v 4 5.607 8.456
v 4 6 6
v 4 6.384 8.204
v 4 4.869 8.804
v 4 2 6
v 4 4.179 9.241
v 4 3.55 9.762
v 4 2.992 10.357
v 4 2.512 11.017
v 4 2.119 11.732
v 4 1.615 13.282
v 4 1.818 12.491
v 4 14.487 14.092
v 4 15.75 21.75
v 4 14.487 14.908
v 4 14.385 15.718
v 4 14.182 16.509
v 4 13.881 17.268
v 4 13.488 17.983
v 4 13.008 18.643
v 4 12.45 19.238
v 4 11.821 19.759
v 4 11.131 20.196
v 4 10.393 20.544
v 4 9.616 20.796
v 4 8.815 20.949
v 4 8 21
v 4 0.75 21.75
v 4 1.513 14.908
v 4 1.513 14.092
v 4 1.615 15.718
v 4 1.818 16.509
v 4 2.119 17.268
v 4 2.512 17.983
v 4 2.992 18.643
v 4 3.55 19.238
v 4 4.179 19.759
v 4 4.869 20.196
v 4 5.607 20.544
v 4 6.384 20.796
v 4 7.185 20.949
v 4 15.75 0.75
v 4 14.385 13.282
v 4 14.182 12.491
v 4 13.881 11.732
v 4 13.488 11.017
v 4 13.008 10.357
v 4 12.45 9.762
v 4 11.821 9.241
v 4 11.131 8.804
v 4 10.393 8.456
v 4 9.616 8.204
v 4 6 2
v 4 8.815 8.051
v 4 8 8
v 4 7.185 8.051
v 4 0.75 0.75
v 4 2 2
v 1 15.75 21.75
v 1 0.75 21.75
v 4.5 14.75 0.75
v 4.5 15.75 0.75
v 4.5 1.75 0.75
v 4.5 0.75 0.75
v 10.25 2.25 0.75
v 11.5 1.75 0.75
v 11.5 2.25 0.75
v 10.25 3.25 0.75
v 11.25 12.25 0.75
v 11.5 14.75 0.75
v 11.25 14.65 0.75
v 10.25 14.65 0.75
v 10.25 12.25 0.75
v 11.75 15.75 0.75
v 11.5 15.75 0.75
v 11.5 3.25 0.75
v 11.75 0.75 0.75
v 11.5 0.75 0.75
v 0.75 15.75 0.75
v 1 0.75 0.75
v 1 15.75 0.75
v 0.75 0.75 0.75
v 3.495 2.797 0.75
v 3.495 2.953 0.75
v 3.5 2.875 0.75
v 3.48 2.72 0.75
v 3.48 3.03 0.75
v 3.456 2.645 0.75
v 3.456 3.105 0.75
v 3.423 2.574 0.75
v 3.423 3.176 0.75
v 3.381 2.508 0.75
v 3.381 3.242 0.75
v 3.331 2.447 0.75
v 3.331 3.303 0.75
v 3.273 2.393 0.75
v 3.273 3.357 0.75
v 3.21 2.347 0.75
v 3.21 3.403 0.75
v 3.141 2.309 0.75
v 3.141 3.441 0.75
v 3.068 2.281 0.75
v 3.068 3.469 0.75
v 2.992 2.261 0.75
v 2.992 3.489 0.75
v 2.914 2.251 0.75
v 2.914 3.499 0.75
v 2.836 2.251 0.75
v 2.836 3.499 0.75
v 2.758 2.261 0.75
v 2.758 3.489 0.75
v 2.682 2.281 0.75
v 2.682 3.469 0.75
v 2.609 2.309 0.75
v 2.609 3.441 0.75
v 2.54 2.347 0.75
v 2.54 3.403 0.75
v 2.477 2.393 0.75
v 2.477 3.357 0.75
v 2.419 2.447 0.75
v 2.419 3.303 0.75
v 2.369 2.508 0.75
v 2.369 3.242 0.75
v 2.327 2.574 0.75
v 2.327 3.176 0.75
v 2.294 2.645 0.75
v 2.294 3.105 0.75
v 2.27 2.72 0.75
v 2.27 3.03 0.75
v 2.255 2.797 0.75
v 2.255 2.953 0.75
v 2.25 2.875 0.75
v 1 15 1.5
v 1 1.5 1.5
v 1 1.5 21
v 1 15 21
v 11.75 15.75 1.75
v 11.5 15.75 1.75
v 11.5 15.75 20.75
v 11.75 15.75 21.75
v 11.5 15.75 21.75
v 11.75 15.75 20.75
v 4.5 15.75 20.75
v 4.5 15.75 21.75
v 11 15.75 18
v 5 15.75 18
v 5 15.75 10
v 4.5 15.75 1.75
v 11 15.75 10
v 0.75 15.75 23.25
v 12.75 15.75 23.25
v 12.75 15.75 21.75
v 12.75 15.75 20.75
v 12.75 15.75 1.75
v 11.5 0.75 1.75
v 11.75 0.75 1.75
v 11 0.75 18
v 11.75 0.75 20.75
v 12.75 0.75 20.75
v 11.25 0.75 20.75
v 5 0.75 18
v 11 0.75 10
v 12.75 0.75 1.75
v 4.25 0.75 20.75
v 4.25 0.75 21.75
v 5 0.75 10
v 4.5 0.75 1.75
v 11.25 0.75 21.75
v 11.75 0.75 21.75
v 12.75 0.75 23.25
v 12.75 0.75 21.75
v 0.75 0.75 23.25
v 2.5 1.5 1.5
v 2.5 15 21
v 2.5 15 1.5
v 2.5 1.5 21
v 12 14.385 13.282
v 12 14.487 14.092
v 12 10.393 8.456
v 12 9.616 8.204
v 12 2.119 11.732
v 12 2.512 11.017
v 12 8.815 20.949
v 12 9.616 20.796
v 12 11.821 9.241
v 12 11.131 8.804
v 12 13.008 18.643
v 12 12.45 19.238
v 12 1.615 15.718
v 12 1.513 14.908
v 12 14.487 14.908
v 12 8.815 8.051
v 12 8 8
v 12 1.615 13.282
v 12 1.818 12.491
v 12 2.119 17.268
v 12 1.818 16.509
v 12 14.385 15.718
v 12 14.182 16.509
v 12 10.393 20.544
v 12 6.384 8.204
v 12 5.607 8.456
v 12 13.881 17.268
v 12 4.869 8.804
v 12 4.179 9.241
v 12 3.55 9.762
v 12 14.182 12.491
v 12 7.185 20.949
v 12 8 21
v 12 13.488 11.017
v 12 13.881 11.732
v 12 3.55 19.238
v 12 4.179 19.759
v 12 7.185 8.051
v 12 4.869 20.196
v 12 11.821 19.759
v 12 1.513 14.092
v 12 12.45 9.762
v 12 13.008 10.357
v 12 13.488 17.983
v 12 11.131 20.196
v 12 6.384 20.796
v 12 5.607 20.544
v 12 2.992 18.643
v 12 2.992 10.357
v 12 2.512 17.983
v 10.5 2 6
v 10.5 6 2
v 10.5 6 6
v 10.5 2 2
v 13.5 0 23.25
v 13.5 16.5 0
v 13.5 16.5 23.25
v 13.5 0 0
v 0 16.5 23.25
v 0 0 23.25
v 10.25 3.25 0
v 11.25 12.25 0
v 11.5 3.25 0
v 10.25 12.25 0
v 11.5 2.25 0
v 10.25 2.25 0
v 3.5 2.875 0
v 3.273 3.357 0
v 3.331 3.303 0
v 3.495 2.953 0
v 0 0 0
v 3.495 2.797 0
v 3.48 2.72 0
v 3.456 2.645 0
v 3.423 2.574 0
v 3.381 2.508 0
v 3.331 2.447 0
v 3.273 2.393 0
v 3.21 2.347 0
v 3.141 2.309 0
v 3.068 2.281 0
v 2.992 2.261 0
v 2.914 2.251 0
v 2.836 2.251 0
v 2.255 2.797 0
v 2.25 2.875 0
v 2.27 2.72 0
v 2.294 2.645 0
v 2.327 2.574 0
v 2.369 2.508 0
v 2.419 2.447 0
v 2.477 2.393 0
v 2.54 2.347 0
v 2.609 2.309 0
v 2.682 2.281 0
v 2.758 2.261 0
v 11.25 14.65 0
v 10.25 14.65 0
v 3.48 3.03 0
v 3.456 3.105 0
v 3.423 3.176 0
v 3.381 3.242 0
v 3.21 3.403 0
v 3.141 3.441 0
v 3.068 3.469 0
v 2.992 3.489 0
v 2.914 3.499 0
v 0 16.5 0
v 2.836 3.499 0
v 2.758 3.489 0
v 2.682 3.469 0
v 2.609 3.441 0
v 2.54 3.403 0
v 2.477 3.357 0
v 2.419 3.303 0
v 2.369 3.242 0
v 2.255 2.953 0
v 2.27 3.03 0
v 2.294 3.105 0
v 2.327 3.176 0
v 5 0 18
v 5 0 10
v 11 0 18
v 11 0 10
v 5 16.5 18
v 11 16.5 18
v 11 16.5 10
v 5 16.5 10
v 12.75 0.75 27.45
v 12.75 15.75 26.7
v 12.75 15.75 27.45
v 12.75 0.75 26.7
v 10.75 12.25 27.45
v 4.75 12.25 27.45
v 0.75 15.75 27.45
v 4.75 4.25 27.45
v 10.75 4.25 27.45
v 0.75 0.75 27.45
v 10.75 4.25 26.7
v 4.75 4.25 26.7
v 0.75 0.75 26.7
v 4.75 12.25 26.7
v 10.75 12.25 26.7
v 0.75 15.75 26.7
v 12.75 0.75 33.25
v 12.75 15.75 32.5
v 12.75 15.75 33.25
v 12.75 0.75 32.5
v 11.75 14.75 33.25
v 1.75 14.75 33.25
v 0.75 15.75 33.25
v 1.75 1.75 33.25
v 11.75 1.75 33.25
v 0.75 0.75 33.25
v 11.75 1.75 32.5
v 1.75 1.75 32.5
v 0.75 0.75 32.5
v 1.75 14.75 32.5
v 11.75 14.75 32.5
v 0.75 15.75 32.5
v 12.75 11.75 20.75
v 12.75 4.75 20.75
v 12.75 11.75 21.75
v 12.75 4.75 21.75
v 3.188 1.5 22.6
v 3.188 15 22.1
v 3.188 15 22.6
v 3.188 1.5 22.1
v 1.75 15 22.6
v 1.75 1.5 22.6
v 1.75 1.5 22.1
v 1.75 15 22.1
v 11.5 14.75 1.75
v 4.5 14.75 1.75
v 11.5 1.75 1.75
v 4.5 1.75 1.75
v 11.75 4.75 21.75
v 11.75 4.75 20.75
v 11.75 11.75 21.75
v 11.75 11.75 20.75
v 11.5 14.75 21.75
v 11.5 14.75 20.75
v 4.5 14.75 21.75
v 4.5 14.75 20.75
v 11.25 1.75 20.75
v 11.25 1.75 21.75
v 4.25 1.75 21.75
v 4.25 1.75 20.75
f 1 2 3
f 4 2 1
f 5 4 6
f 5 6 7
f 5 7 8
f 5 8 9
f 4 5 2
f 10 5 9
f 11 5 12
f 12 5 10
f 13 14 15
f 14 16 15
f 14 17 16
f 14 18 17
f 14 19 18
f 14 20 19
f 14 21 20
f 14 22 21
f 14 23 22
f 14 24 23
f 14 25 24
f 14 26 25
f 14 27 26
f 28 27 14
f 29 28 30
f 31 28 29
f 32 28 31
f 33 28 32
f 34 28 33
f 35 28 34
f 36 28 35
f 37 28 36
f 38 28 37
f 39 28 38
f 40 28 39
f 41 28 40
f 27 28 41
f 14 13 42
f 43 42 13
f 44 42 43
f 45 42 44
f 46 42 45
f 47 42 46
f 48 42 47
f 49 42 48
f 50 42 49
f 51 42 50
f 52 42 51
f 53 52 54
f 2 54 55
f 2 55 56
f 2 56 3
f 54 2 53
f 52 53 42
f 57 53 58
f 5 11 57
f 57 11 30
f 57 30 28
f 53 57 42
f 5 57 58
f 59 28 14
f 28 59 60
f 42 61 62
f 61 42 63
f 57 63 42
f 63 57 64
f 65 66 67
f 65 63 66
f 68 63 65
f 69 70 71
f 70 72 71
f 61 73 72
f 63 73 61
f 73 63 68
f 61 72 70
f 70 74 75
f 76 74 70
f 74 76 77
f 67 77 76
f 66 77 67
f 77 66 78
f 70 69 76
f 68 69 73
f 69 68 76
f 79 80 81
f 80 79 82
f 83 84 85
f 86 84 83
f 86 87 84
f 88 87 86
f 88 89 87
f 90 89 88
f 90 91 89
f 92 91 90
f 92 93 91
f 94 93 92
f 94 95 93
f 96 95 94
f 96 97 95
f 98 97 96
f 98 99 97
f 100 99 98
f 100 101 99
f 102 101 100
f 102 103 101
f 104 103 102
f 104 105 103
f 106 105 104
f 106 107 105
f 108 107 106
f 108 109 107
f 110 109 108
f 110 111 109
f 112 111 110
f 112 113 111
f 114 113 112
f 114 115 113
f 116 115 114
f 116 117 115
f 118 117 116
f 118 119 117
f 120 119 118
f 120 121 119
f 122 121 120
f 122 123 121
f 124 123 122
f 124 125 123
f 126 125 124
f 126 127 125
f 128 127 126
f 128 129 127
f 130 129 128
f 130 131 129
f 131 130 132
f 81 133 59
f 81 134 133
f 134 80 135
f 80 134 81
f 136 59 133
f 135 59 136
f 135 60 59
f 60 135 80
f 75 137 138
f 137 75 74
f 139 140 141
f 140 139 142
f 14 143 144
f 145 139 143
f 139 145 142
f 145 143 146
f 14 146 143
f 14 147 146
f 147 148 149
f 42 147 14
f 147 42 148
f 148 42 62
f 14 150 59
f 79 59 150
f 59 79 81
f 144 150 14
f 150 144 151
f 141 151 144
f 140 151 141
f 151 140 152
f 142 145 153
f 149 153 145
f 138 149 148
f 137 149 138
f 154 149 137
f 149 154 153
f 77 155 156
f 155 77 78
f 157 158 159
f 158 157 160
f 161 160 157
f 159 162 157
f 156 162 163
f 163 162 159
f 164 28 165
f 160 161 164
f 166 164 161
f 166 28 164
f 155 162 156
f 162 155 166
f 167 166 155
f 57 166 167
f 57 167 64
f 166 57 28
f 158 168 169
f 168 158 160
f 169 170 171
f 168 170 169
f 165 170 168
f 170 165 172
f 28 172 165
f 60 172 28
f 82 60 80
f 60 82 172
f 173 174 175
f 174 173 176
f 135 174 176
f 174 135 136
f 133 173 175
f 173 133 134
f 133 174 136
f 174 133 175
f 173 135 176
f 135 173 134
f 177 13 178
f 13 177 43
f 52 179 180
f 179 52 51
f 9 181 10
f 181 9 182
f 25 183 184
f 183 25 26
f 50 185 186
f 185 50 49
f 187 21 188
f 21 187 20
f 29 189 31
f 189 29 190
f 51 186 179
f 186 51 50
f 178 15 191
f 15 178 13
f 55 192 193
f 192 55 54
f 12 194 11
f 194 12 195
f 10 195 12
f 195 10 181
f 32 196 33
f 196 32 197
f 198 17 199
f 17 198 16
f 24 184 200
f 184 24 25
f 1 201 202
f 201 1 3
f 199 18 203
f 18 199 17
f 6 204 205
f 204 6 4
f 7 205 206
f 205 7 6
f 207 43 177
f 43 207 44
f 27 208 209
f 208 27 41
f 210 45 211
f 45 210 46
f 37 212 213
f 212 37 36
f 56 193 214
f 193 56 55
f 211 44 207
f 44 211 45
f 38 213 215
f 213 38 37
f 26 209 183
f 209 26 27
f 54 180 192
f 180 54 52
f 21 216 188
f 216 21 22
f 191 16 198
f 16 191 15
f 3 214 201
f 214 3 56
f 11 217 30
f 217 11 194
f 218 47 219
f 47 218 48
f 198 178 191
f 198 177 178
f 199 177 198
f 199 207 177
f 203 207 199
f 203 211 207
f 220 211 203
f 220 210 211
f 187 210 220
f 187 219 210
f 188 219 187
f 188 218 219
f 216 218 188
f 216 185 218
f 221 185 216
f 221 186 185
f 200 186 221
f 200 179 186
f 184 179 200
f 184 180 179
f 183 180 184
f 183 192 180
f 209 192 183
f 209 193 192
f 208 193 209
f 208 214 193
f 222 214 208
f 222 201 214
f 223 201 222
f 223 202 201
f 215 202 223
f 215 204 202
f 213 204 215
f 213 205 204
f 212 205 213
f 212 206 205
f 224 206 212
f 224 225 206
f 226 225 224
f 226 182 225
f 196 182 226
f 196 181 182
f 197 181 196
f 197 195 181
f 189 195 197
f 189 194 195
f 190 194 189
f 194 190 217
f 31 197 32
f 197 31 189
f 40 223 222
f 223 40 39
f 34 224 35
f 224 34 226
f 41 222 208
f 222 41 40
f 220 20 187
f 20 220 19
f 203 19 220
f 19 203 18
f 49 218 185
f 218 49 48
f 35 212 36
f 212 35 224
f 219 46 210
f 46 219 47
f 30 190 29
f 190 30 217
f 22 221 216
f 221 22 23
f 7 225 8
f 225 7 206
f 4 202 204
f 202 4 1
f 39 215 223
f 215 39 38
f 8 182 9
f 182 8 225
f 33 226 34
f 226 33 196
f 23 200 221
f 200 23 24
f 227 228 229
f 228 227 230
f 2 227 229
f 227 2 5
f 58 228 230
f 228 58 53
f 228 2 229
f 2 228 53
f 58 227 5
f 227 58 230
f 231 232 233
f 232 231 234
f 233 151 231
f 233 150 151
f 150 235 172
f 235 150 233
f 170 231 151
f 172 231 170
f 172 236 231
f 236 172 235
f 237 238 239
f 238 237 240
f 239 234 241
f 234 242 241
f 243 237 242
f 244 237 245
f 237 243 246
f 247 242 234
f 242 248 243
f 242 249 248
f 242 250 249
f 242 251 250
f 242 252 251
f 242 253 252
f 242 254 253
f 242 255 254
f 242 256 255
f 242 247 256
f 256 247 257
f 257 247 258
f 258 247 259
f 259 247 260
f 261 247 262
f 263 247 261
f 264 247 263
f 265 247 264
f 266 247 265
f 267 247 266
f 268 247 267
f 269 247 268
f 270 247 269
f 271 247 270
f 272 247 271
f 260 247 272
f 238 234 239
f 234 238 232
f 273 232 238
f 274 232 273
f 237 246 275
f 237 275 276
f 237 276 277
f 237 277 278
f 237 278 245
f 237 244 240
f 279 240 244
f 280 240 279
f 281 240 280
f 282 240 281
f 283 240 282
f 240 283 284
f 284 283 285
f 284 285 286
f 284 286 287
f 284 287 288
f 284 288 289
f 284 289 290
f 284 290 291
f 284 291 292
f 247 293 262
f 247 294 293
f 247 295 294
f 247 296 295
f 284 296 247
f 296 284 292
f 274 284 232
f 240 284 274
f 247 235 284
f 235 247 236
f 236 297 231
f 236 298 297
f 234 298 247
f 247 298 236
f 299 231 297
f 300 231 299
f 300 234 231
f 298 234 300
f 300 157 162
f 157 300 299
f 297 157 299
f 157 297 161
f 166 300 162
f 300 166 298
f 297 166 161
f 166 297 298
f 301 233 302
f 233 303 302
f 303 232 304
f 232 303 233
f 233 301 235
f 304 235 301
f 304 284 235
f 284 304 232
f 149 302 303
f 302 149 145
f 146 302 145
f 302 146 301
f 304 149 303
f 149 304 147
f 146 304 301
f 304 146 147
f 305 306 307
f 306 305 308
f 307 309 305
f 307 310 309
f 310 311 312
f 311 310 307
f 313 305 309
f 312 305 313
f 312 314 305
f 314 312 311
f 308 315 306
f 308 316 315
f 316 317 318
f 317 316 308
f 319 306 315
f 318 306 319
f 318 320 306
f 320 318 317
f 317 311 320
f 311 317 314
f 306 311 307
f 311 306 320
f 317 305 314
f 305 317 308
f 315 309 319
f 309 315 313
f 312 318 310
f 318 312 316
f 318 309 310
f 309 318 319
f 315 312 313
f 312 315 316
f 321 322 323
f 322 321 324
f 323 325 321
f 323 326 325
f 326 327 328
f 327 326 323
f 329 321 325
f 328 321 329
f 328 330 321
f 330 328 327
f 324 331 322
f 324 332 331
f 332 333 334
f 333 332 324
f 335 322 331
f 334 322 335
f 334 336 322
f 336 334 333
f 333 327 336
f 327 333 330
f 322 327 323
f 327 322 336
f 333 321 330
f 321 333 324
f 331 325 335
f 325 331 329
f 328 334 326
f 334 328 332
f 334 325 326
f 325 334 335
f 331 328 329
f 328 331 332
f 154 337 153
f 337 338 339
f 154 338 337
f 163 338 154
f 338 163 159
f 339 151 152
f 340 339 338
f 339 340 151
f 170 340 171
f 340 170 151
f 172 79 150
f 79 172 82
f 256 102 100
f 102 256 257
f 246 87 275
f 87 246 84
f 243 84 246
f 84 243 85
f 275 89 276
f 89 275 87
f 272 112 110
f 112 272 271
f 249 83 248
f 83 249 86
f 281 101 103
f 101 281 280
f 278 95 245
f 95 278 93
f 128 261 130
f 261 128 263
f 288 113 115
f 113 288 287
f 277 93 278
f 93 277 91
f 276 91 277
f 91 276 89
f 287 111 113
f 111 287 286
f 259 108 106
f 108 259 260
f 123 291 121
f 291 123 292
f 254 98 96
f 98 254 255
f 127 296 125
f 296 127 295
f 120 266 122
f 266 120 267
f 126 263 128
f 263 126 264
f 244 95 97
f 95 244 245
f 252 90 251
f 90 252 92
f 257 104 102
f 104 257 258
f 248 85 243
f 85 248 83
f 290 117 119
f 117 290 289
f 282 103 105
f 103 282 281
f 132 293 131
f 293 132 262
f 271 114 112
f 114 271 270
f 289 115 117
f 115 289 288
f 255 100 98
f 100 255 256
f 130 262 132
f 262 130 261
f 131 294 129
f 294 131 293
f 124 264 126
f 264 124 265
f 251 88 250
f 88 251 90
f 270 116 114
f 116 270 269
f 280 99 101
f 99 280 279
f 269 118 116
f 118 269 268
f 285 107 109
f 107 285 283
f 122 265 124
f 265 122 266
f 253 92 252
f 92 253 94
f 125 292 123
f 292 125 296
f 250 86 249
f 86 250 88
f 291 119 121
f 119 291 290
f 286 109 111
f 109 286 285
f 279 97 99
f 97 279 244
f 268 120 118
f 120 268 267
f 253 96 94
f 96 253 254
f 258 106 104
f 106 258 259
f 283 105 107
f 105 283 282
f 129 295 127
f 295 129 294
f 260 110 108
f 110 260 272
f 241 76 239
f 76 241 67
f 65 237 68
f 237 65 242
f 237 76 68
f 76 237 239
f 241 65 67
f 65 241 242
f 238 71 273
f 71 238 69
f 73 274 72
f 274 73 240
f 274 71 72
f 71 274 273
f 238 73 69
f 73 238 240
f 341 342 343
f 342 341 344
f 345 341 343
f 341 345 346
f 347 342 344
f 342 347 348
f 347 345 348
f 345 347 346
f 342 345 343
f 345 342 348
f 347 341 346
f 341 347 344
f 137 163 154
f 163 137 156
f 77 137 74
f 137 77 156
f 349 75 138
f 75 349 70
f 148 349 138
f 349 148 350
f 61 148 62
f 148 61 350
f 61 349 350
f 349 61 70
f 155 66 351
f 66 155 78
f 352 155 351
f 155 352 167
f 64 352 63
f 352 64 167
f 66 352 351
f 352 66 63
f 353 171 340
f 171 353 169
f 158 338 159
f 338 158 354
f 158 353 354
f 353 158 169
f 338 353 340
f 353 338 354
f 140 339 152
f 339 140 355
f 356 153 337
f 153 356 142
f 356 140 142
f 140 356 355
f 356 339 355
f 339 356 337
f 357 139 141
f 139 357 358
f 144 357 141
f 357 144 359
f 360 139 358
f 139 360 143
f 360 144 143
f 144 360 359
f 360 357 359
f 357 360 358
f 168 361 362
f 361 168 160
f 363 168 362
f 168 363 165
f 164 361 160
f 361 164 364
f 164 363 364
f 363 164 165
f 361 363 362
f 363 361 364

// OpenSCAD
$fn=50;
/* Leslie Speaker assembly */
union() {
    translate([1,0.75,0.75]) color("darkgray") {
        difference() {
            cube([3,15,21]);
            translate([-0.25,0.75,0.75]) {
                cube([1.75,13.5,19.5]);
            }
        }
    }
    translate([4,8,14.5]) color("tan") {
        rotate(a=[0,90,0]) {
            cylinder(r=6.5,h=8);
        }
    }
    translate([4,2,2]) color("gray") {
        cube([6.5,4,4]);
    }
}
/* cabinet bottom */
difference() {
    color("tan") cube([13.5, 0.75, 23.25]);
    translate([5,-0.5,10]) {
        cube([6,1.5,8]);
    }
}
/* cabinet top */
difference() {
    translate([0,15.75,0]) color("tan") {
        cube([13.5,0.75, 23.25]);
    }
    translate([5,15.5,10]) {
        cube([6,1.5,8]);
    }
}
/* speaker-side panel */
/* x=0 to sit flush */
translate([0,0.75,0]) color("wheat") {
    cube([0.75,15,23.25]);
}
/* cylinder-side panel*/
/* x=12.75 to sit flush */
translate([12.75,0.75,0]) color("wheat") {
    cube([0.75,15,23.25]);
}
/* grill */
/* z=21.5 to sit flush */
translate([0.75,0.75,26.70]) color("wheat") {
    difference() {
        cube([12,15,0.75]);
        translate([4,3.5,-0.25]) {
            cube([6,8,1.5]);
        }
    }
}

/* name plate */

translate([1.75,1.5,22.1]) color("black") {
    cube([1.4375,13.5,0.5]);
}

/* grill border */
/* z=22.5 to sit flush */
translate([0.75,0.75,32.5]) color("burlywood") {
    difference() {
        cube([12,15,0.75]);
        translate([1,1,-0.5]) {
            cube([10,13,1.5]);
        }
    }
}

/* rear panel */
/* z=0 to sit flush */
translate([0.75,0.75,0]) color("burlywood") {
    difference() {
        cube([12,15,0.75]);
        /* jack */
        translate([2.125,2.125,-0.25]) {
            cylinder(r=0.625,h=1.5);
        }
        /* sound port */
        /*
        translate([4,3.5,-0.25]) {
            cube([6,8,1.5]);
        }
        */
        /* power connector */
        translate([9.5,1.5,-0.25]) {
            cube([1.25,1,1.5]);
        }
        /* Leslie switch */
        translate([9.5,11.5,-0.25]) {
            cube([1,2.4,1.5]);
        }
        /*
        translate([5.5,1.5,-0.25]) {
            cube([2.4,1,1.5]);
        }
        */
    }
}
/* rear panel cleats */
    /* left */
translate([11.75,0.75,0.75]) {
    cube([1,15,1]);
}

    /* top */
translate([4.5,14.75,0.75]) {
    cube([7,1,1]);
}
    /* bottom */
translate([4.5,0.75,0.75]) {
    cube([7,1,1]);
}

/* front panel cleats */
    /* right bottom */
translate([11.75,0.75,20.75]) {
    cube([1,4,1]);
}
    /* right top */
translate([11.75,11.75,20.75]) {
    cube([1,4,1]);
}
    /* top */
translate([4.5,14.75,20.75]) {
    cube([7,1,1]);
}
    /* bottom */
translate([4.25,0.75,20.75]) {
    cube([7,1,1]);
}

/* reverb unit */
/*
    16.75"
    4.5"
    1.5" deep, with bushings
*/

/* cut list */

/*
  bottom: 13.5" x 23.25"
  side: 15" x 23.25"
  front baffle: 12" x 15"
  grill: 12" x 15"

  top: 13.5" x 23.25"
  side: 15" x 23.25"
  rear panel: 12" x 15"
*/
